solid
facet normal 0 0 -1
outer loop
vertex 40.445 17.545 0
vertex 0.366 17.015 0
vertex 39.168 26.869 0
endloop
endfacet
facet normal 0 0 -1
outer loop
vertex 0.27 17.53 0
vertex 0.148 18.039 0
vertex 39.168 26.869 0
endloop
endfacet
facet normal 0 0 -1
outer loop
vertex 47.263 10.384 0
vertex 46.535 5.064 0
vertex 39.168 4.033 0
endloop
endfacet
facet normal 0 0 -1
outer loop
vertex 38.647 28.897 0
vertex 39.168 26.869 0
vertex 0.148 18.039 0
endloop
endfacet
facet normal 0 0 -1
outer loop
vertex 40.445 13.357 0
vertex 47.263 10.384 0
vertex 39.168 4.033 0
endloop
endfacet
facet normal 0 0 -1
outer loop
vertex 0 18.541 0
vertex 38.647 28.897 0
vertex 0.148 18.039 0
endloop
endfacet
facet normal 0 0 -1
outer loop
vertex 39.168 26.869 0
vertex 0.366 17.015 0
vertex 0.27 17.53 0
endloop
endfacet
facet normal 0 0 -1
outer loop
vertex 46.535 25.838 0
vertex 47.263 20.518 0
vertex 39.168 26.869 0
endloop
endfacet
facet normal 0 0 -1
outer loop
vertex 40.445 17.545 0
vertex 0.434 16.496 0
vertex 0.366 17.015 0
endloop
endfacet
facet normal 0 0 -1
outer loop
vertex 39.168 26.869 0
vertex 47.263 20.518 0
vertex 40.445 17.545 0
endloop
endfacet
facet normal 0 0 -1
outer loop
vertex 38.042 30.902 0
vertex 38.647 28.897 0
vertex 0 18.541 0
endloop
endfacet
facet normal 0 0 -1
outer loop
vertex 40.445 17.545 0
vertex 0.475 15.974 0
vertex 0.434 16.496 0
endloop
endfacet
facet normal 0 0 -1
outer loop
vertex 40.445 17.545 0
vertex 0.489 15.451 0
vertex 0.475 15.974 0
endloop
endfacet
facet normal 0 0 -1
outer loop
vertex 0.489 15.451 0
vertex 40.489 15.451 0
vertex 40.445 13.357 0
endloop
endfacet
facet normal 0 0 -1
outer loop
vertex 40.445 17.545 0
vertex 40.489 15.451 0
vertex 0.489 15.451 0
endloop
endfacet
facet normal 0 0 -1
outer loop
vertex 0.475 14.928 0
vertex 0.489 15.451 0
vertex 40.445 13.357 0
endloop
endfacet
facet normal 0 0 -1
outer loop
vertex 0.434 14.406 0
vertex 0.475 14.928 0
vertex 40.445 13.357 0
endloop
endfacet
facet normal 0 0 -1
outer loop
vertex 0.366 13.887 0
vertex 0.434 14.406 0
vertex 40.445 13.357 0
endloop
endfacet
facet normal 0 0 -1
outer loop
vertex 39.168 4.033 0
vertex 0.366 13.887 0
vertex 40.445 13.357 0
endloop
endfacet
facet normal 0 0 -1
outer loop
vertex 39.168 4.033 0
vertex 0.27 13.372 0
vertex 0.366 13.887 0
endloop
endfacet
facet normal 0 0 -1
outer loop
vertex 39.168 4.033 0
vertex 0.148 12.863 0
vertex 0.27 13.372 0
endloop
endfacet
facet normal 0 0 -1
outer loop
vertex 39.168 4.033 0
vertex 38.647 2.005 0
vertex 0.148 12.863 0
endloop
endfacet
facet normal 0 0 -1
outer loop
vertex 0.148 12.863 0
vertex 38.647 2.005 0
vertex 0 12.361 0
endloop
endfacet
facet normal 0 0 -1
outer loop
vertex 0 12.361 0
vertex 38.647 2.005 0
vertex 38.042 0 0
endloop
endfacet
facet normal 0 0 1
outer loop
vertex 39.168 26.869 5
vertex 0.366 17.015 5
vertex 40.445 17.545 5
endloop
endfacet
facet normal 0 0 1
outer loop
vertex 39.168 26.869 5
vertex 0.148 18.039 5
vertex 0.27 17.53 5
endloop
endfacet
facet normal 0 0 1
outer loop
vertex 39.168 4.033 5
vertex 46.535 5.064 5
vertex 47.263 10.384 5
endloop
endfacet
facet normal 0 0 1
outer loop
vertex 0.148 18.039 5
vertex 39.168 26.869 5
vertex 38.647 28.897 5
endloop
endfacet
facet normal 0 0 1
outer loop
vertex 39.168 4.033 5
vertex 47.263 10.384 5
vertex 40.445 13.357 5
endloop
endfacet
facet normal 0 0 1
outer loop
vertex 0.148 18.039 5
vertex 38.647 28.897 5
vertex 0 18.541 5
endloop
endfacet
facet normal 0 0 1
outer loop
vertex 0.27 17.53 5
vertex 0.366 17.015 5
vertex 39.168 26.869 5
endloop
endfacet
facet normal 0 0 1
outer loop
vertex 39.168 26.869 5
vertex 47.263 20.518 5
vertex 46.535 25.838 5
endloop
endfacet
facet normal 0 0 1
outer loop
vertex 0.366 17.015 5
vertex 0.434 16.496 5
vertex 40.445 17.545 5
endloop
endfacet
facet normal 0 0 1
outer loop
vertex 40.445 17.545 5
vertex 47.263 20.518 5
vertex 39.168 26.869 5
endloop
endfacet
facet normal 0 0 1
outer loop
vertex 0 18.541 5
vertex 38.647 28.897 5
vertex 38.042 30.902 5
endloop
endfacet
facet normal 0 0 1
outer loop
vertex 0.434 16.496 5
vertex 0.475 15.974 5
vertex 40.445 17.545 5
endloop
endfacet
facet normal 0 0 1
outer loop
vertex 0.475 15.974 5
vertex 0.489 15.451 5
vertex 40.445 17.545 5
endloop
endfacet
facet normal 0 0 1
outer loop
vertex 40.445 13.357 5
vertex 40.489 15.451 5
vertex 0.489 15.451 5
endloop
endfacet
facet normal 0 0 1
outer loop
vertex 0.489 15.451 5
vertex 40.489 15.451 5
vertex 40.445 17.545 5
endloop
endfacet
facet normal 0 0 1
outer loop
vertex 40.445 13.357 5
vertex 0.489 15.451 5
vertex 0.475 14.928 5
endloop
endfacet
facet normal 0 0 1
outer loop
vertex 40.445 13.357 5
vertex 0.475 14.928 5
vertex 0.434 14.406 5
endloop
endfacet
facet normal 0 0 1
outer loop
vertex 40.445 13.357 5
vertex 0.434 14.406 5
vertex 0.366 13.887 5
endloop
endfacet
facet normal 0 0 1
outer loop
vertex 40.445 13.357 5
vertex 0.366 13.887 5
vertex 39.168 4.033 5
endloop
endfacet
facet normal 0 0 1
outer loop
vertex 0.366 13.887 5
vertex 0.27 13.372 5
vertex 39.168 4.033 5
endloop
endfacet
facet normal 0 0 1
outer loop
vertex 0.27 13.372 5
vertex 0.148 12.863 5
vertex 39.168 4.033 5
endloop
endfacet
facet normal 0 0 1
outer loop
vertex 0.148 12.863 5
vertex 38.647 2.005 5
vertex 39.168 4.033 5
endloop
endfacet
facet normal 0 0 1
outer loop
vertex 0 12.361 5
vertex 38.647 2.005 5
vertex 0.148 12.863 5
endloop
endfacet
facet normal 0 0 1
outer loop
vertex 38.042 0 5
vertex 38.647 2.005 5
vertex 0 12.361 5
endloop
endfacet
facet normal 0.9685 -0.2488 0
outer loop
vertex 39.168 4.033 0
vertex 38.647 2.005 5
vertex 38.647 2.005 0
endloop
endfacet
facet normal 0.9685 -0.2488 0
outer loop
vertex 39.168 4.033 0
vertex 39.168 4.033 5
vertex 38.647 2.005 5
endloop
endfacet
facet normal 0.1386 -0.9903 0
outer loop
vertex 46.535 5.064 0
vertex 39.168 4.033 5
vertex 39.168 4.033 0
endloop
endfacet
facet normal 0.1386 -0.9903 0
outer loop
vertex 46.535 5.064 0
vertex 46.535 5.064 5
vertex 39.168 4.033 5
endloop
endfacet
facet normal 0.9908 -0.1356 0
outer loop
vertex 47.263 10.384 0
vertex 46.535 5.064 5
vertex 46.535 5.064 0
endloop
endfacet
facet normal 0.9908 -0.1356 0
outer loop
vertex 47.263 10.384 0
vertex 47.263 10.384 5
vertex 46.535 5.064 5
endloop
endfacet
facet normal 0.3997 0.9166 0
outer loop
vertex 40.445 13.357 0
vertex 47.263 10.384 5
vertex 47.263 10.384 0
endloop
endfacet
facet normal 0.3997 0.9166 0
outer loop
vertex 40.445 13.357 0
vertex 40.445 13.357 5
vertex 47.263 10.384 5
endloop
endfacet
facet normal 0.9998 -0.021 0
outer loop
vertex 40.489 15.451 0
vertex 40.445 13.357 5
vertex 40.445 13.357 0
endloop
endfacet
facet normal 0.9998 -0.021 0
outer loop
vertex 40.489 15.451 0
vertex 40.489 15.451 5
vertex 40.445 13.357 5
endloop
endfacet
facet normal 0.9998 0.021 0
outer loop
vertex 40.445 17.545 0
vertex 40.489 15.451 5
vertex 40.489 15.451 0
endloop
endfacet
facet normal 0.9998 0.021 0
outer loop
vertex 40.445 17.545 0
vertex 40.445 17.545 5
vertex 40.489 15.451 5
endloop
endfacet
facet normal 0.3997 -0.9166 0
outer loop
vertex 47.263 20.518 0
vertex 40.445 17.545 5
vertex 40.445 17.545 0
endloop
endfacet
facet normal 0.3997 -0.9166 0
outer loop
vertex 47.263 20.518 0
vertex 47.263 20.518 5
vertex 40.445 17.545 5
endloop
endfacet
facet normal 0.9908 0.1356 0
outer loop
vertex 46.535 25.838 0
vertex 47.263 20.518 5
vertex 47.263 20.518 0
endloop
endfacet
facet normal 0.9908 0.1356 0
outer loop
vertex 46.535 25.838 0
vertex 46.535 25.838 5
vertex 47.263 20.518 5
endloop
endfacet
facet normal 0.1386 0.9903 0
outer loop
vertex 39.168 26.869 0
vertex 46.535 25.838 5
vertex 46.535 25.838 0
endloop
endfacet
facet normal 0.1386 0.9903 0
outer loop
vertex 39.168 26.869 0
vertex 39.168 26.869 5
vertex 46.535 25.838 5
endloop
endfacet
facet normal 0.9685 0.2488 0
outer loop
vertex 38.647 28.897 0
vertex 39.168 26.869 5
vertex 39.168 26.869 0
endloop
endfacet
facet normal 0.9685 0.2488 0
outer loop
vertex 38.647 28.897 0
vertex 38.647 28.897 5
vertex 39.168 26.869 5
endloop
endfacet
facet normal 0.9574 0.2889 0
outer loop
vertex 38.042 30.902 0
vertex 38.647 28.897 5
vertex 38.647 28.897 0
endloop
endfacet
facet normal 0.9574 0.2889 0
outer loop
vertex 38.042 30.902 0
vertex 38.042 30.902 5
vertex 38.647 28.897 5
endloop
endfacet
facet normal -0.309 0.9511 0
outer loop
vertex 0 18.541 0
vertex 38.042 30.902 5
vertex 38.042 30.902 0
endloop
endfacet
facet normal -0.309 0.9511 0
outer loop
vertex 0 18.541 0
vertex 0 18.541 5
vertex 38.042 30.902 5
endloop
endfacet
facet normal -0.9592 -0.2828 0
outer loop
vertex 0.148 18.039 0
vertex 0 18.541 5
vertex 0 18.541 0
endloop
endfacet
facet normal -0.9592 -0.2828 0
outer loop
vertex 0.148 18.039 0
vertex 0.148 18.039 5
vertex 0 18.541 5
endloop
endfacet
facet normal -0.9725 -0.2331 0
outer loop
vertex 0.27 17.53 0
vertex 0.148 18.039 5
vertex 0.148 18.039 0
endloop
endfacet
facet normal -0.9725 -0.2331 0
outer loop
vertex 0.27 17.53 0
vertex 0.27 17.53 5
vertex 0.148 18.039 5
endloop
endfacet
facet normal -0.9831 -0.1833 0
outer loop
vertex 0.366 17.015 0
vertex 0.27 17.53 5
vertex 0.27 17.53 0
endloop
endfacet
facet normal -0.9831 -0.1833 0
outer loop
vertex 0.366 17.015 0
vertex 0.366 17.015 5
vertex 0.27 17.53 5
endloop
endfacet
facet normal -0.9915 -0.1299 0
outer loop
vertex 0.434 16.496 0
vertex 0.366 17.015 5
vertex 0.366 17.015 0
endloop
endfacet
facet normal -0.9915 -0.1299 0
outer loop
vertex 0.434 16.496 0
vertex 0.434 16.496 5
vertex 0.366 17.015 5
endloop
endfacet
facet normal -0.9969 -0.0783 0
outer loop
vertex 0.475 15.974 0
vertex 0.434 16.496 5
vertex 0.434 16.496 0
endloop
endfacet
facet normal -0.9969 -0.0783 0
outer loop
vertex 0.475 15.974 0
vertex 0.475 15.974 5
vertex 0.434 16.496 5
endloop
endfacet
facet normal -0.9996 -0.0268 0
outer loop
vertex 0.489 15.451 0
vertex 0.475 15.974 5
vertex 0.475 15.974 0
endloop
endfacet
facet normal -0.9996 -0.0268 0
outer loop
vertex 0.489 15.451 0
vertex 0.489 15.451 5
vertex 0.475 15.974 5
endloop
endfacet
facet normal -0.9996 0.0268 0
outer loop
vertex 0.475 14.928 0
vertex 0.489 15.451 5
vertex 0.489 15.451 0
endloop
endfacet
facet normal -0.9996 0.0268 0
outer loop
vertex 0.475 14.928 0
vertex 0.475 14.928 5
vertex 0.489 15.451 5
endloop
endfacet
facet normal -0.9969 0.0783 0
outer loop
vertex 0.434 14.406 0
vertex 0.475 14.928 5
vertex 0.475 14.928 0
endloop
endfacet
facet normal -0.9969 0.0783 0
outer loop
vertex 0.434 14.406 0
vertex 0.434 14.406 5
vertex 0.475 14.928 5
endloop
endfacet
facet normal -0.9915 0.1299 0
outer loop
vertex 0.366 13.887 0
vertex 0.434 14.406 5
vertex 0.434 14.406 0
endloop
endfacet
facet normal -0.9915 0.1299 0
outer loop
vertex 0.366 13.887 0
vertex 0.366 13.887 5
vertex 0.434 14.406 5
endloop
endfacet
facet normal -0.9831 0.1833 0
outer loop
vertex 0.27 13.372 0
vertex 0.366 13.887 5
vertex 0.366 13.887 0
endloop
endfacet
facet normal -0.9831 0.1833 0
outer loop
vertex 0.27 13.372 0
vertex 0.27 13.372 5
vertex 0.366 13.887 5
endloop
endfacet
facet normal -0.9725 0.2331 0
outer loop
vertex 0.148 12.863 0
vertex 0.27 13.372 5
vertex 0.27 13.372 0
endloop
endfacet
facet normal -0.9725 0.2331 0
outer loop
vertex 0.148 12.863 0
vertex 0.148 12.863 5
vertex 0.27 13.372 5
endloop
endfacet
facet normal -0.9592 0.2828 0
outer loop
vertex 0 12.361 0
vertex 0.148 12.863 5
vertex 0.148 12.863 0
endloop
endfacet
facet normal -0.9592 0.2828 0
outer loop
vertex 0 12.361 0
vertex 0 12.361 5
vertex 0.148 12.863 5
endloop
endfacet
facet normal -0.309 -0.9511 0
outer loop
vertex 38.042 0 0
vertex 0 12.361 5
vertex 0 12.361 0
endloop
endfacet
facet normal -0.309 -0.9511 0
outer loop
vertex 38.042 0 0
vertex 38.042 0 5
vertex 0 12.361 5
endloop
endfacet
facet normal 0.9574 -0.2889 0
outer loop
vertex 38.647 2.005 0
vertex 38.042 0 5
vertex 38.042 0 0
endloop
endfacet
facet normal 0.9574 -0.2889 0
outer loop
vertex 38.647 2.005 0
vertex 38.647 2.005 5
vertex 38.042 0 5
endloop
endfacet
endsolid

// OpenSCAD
$fn = 32;

// ----------------------------------------------------------------------
// Gear sector: 2 teeth on 36 degrees
// ----------------------------------------------------------------------

// --- parameters (mm) ---
sector_angle = 36;        // sector angle, degrees
root_r = 50;              // root circle radius
tooth_h = 7;              // tooth height over the root circle
teeth = 2;                // number of teeth on the sector
hub_r = 10;               // hub bore radius
plate_t = 5;              // sector thickness, Z
arc_step = 3;             // sampling step of the root/hub arcs, degrees

tip_r = root_r + tooth_h;  // tip circle radius

profile = [[38.042, 0], [38.647, 2.005], [39.168, 4.033], [46.535, 5.064], [47.263, 10.384], [40.445, 13.357], [40.489, 15.451], [40.445, 17.545], [47.263, 20.518], [46.535, 25.838], [39.168, 26.869], [38.647, 28.897], [38.042, 30.902], [0, 18.541], [0.148, 18.039], [0.27, 17.53], [0.366, 17.015], [0.434, 16.496], [0.475, 15.974], [0.489, 15.451], [0.475, 14.928], [0.434, 14.406], [0.366, 13.887], [0.27, 13.372], [0.148, 12.863], [0, 12.361]];  // primary outline, 26 points, counter clockwise

// --- the one profile operation ---
linear_extrude(height = plate_t) polygon(points = profile);
